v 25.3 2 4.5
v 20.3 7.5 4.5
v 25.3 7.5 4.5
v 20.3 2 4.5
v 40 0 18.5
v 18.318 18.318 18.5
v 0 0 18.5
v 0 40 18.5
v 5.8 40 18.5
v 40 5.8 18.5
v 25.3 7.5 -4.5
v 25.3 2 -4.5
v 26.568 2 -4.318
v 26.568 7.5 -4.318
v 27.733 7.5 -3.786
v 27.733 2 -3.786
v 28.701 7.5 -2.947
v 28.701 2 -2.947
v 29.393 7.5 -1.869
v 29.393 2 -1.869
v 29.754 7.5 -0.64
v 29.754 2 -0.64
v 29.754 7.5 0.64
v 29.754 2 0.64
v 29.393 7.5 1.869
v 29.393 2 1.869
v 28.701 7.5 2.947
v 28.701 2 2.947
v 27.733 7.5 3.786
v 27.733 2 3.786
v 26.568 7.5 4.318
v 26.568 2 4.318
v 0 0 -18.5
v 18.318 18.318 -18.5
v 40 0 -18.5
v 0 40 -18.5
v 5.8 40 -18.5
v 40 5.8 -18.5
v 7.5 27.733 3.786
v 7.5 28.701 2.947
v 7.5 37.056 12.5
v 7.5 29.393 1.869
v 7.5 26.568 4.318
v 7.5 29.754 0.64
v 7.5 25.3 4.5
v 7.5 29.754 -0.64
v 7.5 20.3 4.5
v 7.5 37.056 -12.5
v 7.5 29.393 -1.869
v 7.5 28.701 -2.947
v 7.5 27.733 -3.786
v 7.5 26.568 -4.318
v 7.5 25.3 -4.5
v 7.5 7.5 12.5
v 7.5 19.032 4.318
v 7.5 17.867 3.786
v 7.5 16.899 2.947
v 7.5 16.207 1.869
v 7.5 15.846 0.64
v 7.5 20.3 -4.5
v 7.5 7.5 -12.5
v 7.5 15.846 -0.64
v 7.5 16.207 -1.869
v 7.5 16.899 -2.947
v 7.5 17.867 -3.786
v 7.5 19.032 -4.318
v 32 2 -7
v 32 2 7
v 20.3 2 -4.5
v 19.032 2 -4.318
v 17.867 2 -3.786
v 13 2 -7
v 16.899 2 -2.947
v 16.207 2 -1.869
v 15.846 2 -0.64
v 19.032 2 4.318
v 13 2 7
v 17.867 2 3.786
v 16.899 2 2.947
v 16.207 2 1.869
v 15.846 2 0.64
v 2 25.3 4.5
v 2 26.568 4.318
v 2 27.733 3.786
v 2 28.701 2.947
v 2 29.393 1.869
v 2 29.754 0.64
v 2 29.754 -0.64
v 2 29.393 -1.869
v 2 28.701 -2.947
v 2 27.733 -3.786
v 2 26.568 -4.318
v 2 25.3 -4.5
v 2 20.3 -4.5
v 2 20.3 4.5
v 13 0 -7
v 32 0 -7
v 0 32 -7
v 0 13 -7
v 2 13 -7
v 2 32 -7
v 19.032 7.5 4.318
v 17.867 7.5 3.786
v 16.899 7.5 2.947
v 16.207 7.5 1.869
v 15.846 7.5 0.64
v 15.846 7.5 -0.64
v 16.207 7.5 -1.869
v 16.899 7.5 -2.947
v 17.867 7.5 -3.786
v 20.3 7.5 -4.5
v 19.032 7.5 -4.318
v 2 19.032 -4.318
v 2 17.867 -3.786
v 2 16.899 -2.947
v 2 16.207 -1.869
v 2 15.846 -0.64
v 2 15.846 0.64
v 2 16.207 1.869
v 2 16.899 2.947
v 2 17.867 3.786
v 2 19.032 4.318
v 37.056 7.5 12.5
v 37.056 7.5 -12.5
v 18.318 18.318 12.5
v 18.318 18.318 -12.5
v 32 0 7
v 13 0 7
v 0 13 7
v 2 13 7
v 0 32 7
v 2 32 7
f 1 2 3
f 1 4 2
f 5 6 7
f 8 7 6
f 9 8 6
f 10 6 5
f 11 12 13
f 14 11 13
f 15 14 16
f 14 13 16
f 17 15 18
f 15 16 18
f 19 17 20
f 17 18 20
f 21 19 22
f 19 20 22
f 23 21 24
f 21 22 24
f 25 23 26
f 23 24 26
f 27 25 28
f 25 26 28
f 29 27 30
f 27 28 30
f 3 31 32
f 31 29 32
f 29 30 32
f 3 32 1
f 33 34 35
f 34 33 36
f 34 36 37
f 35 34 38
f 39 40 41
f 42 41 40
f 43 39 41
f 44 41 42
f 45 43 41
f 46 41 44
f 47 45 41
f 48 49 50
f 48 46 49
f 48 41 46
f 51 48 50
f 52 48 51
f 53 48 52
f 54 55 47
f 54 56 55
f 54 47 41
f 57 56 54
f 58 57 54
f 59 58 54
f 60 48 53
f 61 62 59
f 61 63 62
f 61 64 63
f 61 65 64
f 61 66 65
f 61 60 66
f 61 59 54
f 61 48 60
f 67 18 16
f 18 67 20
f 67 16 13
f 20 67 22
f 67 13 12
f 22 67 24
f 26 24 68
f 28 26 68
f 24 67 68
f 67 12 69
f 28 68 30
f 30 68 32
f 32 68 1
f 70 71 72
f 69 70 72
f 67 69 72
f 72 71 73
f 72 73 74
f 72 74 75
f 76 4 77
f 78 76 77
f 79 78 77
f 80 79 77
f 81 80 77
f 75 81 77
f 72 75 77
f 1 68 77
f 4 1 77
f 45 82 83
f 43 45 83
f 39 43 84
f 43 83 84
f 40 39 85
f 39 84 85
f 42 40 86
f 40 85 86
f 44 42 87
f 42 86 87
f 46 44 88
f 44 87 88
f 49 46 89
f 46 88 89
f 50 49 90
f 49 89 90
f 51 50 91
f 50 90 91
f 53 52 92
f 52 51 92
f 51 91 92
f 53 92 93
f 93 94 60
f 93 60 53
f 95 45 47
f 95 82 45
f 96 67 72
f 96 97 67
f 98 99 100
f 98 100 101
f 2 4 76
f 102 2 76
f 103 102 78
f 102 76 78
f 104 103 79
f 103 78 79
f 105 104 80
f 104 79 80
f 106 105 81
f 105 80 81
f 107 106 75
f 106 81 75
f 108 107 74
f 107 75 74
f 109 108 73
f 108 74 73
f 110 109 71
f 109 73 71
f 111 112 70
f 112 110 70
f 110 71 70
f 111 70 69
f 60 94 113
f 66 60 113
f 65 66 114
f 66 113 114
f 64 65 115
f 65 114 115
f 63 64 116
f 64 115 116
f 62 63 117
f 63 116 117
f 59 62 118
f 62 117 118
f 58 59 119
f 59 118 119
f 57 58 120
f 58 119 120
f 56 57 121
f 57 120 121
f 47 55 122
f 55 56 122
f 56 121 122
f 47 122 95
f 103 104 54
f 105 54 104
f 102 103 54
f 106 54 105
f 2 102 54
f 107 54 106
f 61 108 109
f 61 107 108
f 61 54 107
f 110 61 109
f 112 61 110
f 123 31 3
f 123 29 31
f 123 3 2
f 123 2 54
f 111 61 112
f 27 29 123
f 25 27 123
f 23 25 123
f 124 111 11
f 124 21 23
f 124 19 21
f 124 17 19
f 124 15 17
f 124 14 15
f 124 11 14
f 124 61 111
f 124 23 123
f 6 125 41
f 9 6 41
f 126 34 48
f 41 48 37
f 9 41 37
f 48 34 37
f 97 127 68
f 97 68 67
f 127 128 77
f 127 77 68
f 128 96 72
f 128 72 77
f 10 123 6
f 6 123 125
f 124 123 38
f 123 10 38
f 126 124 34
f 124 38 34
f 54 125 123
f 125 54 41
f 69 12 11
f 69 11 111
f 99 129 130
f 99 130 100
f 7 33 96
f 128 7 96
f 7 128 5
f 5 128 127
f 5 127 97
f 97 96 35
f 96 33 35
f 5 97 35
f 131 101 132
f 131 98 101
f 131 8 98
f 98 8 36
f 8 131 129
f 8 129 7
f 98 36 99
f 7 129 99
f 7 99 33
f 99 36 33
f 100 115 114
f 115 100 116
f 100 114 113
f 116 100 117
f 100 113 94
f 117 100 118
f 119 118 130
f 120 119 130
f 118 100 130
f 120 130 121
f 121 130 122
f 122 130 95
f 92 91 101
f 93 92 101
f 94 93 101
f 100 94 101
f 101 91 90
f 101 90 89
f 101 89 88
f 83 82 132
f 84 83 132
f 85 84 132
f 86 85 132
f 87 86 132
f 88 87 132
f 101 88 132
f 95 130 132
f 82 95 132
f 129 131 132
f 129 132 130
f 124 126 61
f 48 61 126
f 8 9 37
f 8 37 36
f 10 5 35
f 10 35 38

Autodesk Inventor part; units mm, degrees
sketch "Skizze_1" plane through (0, 0, 0) normal (0, 0, 1) x (1, 0, 0)
  line L0 (0, 0) -> (40, 0)
  line L1 (40, 0) -> (40, 5.8)
  line L2 (40, 5.8) -> (18.3181, 18.3181)
  line L3 (18.3181, 18.3181) -> (5.8, 40)
  line L4 (5.8, 40) -> (0, 40)
  line L5 (0, 40) -> (0, 0)
extrude "Extrusion1" add sketch "Skizze_1" along normal mid plane 37
sketch "Skizze_2" plane through (0, 0, 0) normal (0, 0, 1) x (1, 0, 0)
  line L0 (7.5, 7.5) -> (40, 7.5)
  line L1 (40, 7.5) -> (40, 40)
  line L2 (40, 40) -> (7.5, 40)
  line L3 (7.5, 40) -> (7.5, 7.5)
extrude "Extrusion2" cut sketch "Skizze_2" along normal mid plane 25
sketch "Skizze_3" plane through (0, 0, 0) normal (0, 1, 0) x (-1, 0, 0)
  arc A0 (-20.3, -4.5) -> (-20.3, 4.5) centre (-20.3, 0) ccw
  line L0 (-20.3, 4.5) -> (-25.3, 4.5)
  arc A1 (-25.3, 4.5) -> (-25.3, -4.5) centre (-25.3, 0) ccw
  line L1 (-25.3, -4.5) -> (-20.3, -4.5)
extrude "Extrusion3" cut sketch "Skizze_3" along normal blind 7.5
sketch "Skizze_4" plane through (0, 0, 0) normal (1, 0, 0) x (0, 1, 0)
  arc A0 (20.3, 4.5) -> (20.3, -4.5) centre (20.3, 0) ccw
  line L0 (20.3, -4.5) -> (25.3, -4.5)
  arc A1 (25.3, -4.5) -> (25.3, 4.5) centre (25.3, 0) ccw
  line L1 (25.3, 4.5) -> (20.3, 4.5)
extrude "Extrusion4" cut sketch "Skizze_4" along normal blind 7.5
sketch "Skizze_5" plane through (0, 0, 0) normal (1, 0, 0) x (0, 1, 0)
  line L0 (13, 7) -> (13, -7)
  line L1 (13, -7) -> (32, -7)
  line L2 (32, -7) -> (32, 7)
  line L3 (32, 7) -> (13, 7)
extrude "Extrusion5" cut sketch "Skizze_5" along normal blind 2
sketch "Skizze_6" plane through (0, 0, 0) normal (0, 1, 0) x (-1, 0, 0)
  line L0 (-13, 7) -> (-32, 7)
  line L1 (-32, 7) -> (-32, -7)
  line L2 (-32, -7) -> (-13, -7)
  line L3 (-13, -7) -> (-13, 7)
extrude "Extrusion6" cut sketch "Skizze_6" along normal blind 2
ref_plane "GUS_4500_1_XY" through (7.5, 20, 0) normal (1, 0, 0) x (0, 0, -1)
ref_plane "GUS_4500_1_YZ" through (7.5, 20, 0) normal (0, 0, -1) x (0, 1, 0)
ref_plane "GUS_4500_1_ZX" through (7.5, 20, 0) normal (0, 1, 0) x (1, 0, 0)
ref_plane "GUS_4500_12_XY" through (7.5, 25, 0) normal (1, 0, 0) x (0, 0, -1)
ref_plane "GUS_4500_12_YZ" through (7.5, 25, 0) normal (0, 0, -1) x (0, 1, 0)
ref_plane "GUS_4500_12_ZX" through (7.5, 25, 0) normal (0, 1, 0) x (1, 0, 0)
ref_plane "GUS_4500_2_XY" through (25, 7.5, 0) normal (0, 1, 0) x (1, 0, 0)
ref_plane "GUS_4500_2_YZ" through (25, 7.5, 0) normal (1, 0, 0) x (0, 0, -1)
ref_plane "GUS_4500_2_ZX" through (25, 7.5, 0) normal (0, 0, -1) x (0, 1, 0)
ref_plane "GUS_4500_23_XY" through (20, 7.5, 0) normal (0, 1, 0) x (1, 0, 0)
ref_plane "GUS_4500_23_YZ" through (20, 7.5, 0) normal (1, 0, 0) x (0, 0, -1)
ref_plane "GUS_4500_23_ZX" through (20, 7.5, 0) normal (0, 0, -1) x (0, 1, 0)
ref_plane "p1_XY" through (0, 20, -18.5) normal (0, 0, -1) x (0, 1, 0)
ref_plane "p1_YZ" through (0, 20, -18.5) normal (0, 1, 0) x (1, 0, 0)
ref_plane "p1_ZX" through (0, 20, -18.5) normal (1, 0, 0) x (0, 0, -1)
properties part number "GUS_4501_1"
